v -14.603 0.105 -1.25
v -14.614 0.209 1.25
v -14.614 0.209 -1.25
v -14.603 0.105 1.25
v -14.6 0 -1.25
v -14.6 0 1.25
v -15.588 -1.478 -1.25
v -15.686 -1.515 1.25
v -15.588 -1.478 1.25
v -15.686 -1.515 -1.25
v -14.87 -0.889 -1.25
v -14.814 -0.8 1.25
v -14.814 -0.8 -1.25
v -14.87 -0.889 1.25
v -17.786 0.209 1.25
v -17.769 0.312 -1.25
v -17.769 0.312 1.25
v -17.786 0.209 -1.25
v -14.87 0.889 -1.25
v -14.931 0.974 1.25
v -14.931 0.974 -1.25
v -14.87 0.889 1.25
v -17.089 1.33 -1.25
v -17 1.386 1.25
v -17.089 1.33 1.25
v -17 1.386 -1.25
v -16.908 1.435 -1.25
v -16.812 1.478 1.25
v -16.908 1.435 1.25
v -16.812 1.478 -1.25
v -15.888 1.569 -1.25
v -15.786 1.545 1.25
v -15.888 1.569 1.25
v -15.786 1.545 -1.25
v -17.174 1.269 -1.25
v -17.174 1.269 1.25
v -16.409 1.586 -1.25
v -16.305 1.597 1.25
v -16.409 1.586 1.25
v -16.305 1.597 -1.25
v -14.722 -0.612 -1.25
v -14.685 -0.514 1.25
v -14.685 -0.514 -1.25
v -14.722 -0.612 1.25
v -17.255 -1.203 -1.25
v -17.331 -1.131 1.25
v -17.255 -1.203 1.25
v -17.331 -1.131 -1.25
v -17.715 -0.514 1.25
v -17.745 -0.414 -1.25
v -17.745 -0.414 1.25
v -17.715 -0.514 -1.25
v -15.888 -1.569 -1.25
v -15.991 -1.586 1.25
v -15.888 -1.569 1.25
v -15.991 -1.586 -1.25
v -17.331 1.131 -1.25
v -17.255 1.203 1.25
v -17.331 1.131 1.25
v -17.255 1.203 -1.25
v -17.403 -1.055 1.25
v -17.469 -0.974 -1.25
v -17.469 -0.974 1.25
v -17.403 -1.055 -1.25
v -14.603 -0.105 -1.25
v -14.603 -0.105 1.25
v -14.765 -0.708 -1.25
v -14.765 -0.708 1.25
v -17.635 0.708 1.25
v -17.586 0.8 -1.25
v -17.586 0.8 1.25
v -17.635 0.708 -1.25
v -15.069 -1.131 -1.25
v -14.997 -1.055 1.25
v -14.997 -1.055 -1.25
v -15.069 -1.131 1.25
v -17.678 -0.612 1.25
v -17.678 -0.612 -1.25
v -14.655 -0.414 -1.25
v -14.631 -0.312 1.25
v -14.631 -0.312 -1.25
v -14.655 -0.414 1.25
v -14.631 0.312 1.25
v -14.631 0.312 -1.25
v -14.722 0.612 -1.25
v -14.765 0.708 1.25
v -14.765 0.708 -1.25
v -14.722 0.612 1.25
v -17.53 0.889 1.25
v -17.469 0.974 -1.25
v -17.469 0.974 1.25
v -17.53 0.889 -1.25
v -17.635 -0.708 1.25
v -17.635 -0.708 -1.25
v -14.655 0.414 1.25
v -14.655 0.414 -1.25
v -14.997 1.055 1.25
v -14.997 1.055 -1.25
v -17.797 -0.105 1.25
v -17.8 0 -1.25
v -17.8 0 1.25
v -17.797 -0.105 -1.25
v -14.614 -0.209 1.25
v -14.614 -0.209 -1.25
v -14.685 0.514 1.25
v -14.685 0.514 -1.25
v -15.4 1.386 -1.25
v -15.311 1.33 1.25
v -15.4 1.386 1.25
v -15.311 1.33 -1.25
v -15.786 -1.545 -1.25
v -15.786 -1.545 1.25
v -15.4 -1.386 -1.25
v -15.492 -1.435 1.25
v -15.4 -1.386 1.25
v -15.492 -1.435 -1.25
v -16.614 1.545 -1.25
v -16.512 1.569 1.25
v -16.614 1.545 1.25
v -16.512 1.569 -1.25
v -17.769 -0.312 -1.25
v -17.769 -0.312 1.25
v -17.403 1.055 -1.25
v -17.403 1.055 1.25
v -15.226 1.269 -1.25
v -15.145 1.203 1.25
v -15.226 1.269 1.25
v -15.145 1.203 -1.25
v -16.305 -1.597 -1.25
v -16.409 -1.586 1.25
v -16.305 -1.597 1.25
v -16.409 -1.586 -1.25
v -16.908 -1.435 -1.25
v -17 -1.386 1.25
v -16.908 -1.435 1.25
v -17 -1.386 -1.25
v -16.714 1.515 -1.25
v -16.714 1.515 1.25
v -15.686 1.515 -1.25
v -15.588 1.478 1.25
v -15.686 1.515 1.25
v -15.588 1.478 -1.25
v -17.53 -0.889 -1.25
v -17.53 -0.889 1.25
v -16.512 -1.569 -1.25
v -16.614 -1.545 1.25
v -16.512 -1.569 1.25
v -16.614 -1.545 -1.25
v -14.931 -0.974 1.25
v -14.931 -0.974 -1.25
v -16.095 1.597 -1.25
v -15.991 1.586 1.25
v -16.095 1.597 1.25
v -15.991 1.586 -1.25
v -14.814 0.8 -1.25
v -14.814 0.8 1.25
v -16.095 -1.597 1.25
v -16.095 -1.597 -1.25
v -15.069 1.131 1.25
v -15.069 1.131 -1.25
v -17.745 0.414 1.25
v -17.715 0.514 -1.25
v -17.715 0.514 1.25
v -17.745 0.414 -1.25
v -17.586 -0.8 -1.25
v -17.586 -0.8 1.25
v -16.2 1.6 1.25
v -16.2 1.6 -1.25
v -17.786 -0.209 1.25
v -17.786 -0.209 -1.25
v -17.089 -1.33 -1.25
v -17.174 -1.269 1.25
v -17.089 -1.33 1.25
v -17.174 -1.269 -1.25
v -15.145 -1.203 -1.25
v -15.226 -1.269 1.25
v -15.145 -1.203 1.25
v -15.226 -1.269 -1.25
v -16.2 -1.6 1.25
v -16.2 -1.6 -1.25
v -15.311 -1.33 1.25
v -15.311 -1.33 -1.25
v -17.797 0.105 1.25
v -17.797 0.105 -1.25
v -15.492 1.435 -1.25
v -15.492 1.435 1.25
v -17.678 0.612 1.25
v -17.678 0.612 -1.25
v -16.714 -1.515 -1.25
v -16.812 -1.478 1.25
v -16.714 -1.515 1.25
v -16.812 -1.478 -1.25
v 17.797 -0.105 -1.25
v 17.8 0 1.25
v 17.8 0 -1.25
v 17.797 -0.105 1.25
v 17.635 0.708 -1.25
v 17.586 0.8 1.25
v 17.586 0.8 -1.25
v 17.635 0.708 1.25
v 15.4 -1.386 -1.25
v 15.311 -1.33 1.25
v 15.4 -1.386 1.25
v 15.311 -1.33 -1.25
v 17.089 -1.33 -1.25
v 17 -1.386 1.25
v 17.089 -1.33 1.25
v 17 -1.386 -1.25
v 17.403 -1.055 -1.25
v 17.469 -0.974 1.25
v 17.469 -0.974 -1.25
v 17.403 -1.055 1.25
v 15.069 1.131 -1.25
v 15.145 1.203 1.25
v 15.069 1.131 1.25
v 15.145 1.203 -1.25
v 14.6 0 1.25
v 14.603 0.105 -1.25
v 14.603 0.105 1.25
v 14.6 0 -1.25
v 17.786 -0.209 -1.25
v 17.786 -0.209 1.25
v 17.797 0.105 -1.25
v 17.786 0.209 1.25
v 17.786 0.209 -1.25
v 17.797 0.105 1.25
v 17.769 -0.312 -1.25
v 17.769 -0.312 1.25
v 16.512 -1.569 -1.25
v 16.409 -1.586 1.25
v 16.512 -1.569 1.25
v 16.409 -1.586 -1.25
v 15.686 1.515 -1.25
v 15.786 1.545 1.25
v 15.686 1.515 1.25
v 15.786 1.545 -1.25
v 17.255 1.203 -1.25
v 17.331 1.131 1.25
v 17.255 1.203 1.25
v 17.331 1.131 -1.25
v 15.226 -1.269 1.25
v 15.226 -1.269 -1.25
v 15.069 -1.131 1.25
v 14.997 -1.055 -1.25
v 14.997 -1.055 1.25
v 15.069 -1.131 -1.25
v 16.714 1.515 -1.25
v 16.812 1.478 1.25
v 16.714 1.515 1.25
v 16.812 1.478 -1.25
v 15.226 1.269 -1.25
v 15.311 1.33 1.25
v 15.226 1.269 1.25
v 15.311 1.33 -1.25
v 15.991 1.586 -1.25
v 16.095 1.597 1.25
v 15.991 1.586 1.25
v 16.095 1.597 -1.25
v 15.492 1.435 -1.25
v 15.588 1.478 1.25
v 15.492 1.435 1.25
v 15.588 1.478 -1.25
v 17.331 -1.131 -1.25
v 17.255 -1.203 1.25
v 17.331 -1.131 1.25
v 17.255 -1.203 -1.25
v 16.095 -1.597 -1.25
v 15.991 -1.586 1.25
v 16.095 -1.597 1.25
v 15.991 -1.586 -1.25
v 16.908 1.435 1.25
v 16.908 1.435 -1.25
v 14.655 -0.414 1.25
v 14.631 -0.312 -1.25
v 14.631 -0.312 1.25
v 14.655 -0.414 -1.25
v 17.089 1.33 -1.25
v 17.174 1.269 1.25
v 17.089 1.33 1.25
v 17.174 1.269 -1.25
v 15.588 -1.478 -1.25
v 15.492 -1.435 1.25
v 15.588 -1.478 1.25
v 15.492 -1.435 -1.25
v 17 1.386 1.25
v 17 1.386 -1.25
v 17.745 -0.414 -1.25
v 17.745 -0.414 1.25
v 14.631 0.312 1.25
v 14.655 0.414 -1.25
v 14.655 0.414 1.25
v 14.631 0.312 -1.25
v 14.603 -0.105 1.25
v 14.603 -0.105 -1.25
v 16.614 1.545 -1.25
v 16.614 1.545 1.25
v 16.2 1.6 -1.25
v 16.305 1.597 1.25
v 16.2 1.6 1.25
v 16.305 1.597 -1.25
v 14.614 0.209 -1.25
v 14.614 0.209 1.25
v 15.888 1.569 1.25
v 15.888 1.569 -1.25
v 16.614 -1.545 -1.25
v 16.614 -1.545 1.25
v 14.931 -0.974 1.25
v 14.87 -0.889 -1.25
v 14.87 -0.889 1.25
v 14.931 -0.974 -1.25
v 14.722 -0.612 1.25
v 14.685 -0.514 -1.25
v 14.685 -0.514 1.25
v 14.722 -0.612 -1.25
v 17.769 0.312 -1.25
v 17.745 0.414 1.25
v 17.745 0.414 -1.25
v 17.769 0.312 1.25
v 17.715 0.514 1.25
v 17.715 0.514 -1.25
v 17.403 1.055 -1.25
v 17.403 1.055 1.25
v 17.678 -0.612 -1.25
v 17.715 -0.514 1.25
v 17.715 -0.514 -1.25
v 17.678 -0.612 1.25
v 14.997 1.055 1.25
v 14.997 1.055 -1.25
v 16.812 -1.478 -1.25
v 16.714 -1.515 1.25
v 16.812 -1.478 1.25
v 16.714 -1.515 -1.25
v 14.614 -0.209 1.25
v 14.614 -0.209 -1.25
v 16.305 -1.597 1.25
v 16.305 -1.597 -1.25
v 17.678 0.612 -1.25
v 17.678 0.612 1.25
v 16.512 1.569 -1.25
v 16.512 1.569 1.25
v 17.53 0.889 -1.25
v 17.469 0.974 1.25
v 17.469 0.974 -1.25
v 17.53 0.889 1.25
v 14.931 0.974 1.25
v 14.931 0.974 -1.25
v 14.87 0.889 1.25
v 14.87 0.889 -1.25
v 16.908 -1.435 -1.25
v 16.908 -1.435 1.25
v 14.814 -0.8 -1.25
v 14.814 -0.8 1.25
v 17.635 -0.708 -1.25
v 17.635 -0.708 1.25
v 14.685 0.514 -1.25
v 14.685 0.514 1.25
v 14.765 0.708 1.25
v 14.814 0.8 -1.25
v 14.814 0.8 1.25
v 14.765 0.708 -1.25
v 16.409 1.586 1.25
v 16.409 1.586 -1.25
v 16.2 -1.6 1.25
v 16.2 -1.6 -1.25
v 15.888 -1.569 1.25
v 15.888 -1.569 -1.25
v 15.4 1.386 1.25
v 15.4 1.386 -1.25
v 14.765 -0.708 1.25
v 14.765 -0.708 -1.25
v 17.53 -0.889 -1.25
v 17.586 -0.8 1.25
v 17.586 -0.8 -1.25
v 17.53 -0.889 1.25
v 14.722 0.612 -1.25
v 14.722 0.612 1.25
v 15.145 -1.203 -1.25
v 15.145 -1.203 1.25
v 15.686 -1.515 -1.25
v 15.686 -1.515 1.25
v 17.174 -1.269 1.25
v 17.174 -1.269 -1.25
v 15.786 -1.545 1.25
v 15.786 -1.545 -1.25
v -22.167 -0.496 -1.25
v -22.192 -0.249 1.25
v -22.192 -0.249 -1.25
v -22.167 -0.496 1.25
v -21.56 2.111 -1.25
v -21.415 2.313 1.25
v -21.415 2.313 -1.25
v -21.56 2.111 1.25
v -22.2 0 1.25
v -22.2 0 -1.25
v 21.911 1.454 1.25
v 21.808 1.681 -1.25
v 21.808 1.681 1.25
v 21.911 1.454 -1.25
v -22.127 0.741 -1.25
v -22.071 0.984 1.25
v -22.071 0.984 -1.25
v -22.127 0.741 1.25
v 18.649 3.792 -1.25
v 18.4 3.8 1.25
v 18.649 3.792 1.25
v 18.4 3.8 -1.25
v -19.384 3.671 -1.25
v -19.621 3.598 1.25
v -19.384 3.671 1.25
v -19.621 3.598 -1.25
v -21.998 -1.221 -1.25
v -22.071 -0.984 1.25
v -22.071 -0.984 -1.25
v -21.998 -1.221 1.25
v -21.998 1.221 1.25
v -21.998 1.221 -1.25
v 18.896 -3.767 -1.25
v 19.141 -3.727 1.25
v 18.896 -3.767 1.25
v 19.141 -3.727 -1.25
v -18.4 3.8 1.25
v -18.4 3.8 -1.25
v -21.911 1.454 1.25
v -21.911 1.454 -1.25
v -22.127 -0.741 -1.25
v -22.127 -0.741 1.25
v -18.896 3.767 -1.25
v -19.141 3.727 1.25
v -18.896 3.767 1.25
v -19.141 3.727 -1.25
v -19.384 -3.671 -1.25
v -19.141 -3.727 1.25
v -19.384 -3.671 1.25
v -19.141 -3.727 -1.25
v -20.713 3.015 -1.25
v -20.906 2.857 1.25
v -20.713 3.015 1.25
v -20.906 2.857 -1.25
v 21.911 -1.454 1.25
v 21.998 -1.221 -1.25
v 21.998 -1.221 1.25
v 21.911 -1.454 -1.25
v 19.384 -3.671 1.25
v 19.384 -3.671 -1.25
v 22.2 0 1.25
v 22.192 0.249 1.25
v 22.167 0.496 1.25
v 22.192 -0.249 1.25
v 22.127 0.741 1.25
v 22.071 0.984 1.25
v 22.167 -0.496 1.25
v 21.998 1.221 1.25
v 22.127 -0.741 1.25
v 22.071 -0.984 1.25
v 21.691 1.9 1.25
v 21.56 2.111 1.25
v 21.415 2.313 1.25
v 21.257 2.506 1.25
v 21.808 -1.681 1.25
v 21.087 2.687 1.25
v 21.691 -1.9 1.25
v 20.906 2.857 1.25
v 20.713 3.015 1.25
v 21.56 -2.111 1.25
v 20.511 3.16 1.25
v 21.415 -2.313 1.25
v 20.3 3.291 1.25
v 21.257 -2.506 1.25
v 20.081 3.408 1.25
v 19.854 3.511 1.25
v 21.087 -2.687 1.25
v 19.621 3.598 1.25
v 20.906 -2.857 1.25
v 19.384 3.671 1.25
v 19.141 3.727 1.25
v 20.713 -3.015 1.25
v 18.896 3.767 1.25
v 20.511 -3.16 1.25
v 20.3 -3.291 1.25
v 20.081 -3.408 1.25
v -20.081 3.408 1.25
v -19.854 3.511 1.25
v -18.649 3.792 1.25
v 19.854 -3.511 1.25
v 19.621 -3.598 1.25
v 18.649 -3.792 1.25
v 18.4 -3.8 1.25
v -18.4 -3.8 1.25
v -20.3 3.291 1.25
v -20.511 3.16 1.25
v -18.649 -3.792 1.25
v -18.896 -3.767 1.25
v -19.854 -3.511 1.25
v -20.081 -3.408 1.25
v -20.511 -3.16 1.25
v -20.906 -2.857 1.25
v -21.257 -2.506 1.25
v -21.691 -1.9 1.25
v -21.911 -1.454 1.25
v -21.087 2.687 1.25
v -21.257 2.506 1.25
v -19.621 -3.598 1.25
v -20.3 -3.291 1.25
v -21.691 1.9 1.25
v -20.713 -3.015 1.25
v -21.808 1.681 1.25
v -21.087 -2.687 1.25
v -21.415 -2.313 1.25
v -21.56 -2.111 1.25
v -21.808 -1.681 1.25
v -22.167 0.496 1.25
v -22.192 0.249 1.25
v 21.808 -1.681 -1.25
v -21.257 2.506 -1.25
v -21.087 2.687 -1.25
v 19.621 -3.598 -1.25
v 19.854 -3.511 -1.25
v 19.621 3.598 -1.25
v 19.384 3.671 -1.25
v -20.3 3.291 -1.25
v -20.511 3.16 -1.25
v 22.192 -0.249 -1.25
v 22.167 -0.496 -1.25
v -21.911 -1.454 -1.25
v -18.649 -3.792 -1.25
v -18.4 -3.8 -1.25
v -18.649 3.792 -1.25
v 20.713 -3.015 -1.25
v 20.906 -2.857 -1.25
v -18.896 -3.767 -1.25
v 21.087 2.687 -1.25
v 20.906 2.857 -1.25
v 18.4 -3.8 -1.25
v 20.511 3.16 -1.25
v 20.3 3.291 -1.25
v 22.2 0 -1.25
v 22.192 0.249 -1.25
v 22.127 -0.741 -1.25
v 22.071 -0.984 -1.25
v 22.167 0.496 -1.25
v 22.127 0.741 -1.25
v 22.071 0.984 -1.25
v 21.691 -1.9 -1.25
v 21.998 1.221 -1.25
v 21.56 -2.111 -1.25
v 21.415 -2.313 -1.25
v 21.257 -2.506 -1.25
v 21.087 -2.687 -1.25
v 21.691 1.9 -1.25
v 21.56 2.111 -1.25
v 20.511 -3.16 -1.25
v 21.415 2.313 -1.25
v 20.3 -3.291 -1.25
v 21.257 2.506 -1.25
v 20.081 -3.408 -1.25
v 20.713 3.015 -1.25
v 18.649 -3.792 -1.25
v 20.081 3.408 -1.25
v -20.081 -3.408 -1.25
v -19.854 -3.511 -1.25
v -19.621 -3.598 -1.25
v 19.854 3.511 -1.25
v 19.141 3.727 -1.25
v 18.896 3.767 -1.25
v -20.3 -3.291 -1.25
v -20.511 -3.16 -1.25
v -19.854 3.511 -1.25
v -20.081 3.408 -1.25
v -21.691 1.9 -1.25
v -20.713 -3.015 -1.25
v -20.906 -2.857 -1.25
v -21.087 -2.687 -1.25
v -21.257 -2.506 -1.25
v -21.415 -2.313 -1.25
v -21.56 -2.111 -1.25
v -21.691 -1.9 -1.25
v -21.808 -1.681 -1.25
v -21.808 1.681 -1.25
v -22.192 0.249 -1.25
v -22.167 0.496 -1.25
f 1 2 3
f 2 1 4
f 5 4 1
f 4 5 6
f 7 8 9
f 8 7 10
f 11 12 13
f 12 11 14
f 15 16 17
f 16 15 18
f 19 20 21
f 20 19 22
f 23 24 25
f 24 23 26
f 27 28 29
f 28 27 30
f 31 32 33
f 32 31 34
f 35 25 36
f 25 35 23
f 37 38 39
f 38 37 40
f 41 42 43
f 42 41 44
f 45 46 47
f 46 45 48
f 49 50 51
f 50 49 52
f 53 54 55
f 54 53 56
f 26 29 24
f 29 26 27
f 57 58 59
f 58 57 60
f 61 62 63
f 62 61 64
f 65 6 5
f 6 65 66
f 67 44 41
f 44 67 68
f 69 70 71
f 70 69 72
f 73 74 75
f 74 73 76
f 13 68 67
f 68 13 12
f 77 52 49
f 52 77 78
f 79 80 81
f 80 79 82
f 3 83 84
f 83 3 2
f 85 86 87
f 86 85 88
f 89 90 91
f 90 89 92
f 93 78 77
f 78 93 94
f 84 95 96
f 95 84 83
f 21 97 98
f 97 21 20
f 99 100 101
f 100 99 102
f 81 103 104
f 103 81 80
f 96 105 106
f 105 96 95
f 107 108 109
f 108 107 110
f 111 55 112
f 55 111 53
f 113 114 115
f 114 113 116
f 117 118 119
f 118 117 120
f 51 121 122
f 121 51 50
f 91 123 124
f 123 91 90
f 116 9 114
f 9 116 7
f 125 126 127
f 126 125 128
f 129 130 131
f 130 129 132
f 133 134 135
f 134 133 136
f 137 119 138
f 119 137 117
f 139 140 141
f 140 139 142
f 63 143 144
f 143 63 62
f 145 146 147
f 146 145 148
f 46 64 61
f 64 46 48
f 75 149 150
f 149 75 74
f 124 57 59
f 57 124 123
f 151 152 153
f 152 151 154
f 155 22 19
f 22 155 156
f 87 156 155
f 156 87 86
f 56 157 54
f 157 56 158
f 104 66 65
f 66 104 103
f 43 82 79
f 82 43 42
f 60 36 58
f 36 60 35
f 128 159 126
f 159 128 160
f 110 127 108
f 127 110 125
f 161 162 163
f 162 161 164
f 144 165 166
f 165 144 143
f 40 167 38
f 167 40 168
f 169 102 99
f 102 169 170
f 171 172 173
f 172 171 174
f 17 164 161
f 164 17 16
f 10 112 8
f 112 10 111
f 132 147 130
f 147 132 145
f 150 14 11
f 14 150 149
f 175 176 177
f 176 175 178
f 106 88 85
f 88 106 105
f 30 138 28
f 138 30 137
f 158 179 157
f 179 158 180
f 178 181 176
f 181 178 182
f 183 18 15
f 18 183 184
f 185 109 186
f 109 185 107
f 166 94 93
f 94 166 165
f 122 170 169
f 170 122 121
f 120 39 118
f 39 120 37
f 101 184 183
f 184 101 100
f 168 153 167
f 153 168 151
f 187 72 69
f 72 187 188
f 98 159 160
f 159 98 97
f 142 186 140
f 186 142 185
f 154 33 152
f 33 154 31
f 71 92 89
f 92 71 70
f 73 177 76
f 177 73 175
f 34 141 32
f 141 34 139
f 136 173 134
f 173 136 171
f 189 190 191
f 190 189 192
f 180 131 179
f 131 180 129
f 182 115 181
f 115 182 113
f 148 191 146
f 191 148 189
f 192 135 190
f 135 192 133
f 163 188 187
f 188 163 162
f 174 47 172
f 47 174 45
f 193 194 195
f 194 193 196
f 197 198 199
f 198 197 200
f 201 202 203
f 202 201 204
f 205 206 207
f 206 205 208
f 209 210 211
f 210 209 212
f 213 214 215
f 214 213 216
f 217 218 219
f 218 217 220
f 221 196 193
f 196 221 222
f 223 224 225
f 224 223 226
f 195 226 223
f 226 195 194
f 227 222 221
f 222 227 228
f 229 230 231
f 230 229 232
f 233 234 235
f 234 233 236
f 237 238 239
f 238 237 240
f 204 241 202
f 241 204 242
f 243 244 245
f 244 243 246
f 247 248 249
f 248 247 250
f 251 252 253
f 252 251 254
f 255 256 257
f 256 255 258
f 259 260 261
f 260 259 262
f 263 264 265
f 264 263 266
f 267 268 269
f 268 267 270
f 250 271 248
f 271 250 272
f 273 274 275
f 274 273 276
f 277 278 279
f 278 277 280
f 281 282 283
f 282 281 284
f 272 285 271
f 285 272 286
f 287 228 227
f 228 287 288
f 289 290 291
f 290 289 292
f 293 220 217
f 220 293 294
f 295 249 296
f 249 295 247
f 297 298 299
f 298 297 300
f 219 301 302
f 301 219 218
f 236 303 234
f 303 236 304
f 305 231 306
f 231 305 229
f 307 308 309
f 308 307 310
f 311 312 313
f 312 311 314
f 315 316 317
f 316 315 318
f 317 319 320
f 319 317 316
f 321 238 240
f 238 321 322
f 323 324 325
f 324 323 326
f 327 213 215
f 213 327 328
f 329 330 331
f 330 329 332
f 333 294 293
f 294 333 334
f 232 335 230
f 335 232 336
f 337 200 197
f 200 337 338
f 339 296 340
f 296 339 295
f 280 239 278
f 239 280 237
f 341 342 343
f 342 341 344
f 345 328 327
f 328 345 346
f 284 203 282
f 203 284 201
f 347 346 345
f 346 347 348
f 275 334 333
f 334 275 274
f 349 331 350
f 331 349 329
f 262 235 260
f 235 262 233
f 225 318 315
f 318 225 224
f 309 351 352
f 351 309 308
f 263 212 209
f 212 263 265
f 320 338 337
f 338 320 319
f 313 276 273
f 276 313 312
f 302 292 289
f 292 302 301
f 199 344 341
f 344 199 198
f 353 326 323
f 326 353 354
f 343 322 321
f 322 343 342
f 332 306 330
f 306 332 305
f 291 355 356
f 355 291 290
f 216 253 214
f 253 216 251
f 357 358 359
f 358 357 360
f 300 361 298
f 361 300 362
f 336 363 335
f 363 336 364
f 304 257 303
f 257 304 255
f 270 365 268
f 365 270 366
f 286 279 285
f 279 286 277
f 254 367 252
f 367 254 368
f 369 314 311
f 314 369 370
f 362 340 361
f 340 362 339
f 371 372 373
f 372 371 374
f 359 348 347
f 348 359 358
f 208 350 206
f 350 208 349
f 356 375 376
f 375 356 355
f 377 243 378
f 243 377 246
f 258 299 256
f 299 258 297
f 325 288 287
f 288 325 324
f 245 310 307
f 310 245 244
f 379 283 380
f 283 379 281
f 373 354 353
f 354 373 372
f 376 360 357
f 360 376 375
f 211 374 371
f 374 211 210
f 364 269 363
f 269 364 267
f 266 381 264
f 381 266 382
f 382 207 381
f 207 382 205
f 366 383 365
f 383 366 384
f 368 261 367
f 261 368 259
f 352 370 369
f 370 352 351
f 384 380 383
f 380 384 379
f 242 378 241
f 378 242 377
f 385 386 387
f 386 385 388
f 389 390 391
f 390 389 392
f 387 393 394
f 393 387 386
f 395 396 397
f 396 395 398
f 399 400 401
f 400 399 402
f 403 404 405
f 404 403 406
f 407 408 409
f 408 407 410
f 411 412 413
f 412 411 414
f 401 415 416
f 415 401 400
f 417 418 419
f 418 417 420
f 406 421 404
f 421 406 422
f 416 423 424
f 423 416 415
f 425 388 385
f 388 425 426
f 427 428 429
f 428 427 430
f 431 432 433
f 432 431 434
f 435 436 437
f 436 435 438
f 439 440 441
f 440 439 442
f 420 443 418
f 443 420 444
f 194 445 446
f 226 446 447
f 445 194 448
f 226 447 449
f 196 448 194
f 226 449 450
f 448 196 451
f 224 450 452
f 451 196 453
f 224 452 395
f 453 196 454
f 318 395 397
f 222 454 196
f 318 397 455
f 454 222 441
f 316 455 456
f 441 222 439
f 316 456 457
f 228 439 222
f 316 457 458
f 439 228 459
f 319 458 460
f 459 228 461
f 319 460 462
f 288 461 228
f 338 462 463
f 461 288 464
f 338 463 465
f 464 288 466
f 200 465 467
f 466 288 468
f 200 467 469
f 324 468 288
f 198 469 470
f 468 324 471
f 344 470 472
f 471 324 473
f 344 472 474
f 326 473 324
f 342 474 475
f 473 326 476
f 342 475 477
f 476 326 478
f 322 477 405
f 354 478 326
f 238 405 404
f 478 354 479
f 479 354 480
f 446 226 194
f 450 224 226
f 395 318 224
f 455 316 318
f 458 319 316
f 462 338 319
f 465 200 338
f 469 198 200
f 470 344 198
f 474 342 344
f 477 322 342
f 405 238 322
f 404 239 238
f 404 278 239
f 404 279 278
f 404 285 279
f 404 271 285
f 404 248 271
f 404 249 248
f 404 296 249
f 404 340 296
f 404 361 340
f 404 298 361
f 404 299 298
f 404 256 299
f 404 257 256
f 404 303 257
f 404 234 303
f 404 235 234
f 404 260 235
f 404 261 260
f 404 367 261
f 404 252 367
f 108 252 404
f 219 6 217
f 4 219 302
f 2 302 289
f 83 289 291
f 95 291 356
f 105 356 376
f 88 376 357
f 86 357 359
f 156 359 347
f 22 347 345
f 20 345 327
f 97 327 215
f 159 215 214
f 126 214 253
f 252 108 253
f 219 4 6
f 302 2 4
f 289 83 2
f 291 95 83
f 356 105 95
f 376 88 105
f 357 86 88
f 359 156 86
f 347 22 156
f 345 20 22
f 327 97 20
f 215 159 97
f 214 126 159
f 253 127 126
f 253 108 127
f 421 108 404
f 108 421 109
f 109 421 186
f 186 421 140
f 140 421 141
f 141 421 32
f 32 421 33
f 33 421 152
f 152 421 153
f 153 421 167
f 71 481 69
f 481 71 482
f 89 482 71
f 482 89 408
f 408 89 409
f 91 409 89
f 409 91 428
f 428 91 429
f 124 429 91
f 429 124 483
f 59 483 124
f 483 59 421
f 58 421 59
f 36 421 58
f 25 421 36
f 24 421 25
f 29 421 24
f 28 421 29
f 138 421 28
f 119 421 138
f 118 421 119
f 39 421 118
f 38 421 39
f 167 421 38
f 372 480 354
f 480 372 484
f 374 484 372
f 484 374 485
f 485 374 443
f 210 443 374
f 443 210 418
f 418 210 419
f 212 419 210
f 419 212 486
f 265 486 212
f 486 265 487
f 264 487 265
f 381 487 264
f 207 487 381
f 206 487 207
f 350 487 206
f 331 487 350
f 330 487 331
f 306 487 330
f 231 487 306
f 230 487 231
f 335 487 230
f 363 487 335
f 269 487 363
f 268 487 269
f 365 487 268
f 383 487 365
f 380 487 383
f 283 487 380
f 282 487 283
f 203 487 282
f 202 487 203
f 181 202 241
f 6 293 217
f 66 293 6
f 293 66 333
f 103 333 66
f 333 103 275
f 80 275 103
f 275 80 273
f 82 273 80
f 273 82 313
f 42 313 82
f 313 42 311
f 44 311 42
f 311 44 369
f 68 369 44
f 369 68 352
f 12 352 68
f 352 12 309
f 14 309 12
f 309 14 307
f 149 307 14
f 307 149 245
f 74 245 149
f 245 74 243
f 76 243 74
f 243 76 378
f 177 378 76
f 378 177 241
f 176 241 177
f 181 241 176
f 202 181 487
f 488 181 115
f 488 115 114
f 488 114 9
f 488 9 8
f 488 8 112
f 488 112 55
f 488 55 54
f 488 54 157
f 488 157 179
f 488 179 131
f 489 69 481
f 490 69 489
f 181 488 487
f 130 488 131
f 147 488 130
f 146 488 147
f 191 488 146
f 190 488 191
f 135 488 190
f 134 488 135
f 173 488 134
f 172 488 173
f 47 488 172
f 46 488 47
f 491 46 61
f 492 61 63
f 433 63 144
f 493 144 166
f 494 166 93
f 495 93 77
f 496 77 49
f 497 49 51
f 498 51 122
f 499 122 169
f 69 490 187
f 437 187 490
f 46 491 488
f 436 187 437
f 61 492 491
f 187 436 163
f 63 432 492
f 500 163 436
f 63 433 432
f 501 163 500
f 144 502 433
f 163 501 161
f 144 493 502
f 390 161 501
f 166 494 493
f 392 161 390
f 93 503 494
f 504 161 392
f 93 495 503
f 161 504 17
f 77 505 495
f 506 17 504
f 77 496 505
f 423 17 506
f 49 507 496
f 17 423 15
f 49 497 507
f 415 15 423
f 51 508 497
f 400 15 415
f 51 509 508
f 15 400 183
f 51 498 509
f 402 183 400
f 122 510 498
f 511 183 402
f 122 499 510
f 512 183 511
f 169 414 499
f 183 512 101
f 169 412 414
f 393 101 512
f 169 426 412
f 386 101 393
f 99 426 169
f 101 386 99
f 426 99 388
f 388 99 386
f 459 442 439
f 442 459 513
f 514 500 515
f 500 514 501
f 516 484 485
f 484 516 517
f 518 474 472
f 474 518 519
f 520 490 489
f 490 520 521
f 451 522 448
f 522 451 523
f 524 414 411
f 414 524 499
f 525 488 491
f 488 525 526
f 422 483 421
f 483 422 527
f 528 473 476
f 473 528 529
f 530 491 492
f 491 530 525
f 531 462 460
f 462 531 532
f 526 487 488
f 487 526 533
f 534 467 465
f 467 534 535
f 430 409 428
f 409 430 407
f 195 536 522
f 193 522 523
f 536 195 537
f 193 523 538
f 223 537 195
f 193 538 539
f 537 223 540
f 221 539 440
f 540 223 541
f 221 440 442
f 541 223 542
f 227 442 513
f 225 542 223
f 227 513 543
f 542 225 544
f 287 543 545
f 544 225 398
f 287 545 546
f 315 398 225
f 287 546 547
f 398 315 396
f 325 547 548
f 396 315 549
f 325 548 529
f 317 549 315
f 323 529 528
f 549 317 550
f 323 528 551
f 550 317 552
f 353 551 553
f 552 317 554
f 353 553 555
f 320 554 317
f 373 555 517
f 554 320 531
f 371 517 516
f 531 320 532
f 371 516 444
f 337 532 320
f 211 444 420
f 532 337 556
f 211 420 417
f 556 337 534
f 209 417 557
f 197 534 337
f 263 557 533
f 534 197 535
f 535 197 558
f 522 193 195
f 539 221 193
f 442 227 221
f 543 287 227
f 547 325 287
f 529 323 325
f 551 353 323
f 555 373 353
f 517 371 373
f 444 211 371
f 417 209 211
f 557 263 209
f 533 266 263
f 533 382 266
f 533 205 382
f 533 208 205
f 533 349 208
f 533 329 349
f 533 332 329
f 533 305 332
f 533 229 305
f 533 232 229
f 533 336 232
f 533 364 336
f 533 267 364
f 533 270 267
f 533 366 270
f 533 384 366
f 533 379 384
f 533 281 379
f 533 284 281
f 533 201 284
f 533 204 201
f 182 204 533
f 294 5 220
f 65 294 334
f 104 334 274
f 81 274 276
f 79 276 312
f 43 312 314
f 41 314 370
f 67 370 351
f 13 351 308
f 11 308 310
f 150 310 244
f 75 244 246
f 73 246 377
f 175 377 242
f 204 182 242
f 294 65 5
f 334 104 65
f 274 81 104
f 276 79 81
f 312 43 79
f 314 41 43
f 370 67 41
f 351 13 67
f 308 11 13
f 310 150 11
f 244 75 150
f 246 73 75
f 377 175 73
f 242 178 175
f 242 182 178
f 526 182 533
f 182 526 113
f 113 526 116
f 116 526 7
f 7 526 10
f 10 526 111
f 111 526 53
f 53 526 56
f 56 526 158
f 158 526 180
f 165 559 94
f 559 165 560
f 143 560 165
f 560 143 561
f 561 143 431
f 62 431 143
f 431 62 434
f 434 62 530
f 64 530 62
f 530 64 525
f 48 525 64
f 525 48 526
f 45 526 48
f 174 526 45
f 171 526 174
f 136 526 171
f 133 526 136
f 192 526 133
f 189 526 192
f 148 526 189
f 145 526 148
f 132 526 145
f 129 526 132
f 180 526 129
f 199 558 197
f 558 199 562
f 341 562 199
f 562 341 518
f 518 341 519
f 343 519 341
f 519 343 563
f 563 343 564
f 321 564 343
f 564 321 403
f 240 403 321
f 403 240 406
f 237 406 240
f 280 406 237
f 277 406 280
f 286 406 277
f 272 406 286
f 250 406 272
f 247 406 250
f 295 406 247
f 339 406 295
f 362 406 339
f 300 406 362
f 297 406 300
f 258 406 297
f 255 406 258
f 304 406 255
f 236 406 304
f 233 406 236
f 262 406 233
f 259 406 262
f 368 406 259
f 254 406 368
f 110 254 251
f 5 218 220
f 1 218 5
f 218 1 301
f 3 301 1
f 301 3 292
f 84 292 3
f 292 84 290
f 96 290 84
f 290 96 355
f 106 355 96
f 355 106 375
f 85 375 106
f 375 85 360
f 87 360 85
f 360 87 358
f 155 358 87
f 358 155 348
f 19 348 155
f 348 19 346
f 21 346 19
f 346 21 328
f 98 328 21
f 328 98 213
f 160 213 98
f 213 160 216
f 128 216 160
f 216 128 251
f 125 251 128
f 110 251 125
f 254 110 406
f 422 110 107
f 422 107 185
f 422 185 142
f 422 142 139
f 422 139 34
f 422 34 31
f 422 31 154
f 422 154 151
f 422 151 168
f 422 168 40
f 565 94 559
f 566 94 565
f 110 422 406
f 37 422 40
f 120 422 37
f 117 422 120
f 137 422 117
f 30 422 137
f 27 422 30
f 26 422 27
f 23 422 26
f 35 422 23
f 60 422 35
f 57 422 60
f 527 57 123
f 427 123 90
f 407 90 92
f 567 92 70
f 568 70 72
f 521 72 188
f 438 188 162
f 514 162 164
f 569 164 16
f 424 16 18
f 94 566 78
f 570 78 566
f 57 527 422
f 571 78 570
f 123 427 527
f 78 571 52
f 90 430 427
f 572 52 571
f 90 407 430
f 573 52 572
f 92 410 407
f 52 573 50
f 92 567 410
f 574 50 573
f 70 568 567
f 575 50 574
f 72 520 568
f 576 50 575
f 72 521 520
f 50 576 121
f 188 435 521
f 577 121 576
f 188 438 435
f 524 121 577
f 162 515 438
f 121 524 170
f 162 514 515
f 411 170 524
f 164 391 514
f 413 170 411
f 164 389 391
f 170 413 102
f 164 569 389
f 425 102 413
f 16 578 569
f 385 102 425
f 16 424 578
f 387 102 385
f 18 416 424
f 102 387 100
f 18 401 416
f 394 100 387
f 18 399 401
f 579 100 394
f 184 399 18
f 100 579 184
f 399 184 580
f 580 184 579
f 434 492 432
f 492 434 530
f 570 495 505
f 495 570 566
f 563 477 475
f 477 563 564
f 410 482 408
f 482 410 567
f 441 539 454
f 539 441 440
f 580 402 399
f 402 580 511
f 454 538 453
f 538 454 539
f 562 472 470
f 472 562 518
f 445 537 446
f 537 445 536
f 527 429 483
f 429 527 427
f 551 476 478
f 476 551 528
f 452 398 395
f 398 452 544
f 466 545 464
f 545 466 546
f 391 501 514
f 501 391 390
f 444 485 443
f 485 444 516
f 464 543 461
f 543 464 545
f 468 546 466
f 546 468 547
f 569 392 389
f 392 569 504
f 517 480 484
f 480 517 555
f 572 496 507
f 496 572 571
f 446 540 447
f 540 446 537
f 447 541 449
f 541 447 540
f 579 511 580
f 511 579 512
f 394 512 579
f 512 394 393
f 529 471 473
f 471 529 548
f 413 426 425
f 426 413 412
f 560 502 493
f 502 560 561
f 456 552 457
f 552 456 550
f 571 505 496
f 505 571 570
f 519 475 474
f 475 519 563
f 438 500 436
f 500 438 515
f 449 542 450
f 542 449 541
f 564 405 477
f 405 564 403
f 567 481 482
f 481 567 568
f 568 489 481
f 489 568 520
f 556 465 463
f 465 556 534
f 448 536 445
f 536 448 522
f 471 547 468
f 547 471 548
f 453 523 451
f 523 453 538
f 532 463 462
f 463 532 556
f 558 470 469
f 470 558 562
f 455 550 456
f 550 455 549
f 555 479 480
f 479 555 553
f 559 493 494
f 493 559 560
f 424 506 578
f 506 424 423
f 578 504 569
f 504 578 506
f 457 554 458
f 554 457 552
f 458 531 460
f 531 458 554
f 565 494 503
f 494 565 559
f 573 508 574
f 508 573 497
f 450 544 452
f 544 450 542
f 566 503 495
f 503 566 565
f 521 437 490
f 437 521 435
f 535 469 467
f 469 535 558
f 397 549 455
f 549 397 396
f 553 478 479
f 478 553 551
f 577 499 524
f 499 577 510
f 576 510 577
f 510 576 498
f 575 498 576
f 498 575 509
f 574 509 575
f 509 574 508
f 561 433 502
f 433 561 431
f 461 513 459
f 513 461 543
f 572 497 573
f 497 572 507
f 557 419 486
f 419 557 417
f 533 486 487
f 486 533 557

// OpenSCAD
$fn=96;

L = 44.4;
W = 7.6;
T = 2.5;

hole_d = 3.2;
end_offset = 6.0;

module capsule2d(len, wid){
    r = wid/2;
    hull(){
        translate([-(len/2 - r), 0]) circle(r=r);
        translate([ (len/2 - r), 0]) circle(r=r);
    }
}

module link_plate(){
    difference(){
        linear_extrude(height=T, center=true)
            capsule2d(L, W);

        for (sx = [-1, 1]){
            translate([sx*(L/2 - end_offset), 0, 0])
                cylinder(h=T+0.6, d=hole_d, center=true);
        }
    }
}

link_plate();
